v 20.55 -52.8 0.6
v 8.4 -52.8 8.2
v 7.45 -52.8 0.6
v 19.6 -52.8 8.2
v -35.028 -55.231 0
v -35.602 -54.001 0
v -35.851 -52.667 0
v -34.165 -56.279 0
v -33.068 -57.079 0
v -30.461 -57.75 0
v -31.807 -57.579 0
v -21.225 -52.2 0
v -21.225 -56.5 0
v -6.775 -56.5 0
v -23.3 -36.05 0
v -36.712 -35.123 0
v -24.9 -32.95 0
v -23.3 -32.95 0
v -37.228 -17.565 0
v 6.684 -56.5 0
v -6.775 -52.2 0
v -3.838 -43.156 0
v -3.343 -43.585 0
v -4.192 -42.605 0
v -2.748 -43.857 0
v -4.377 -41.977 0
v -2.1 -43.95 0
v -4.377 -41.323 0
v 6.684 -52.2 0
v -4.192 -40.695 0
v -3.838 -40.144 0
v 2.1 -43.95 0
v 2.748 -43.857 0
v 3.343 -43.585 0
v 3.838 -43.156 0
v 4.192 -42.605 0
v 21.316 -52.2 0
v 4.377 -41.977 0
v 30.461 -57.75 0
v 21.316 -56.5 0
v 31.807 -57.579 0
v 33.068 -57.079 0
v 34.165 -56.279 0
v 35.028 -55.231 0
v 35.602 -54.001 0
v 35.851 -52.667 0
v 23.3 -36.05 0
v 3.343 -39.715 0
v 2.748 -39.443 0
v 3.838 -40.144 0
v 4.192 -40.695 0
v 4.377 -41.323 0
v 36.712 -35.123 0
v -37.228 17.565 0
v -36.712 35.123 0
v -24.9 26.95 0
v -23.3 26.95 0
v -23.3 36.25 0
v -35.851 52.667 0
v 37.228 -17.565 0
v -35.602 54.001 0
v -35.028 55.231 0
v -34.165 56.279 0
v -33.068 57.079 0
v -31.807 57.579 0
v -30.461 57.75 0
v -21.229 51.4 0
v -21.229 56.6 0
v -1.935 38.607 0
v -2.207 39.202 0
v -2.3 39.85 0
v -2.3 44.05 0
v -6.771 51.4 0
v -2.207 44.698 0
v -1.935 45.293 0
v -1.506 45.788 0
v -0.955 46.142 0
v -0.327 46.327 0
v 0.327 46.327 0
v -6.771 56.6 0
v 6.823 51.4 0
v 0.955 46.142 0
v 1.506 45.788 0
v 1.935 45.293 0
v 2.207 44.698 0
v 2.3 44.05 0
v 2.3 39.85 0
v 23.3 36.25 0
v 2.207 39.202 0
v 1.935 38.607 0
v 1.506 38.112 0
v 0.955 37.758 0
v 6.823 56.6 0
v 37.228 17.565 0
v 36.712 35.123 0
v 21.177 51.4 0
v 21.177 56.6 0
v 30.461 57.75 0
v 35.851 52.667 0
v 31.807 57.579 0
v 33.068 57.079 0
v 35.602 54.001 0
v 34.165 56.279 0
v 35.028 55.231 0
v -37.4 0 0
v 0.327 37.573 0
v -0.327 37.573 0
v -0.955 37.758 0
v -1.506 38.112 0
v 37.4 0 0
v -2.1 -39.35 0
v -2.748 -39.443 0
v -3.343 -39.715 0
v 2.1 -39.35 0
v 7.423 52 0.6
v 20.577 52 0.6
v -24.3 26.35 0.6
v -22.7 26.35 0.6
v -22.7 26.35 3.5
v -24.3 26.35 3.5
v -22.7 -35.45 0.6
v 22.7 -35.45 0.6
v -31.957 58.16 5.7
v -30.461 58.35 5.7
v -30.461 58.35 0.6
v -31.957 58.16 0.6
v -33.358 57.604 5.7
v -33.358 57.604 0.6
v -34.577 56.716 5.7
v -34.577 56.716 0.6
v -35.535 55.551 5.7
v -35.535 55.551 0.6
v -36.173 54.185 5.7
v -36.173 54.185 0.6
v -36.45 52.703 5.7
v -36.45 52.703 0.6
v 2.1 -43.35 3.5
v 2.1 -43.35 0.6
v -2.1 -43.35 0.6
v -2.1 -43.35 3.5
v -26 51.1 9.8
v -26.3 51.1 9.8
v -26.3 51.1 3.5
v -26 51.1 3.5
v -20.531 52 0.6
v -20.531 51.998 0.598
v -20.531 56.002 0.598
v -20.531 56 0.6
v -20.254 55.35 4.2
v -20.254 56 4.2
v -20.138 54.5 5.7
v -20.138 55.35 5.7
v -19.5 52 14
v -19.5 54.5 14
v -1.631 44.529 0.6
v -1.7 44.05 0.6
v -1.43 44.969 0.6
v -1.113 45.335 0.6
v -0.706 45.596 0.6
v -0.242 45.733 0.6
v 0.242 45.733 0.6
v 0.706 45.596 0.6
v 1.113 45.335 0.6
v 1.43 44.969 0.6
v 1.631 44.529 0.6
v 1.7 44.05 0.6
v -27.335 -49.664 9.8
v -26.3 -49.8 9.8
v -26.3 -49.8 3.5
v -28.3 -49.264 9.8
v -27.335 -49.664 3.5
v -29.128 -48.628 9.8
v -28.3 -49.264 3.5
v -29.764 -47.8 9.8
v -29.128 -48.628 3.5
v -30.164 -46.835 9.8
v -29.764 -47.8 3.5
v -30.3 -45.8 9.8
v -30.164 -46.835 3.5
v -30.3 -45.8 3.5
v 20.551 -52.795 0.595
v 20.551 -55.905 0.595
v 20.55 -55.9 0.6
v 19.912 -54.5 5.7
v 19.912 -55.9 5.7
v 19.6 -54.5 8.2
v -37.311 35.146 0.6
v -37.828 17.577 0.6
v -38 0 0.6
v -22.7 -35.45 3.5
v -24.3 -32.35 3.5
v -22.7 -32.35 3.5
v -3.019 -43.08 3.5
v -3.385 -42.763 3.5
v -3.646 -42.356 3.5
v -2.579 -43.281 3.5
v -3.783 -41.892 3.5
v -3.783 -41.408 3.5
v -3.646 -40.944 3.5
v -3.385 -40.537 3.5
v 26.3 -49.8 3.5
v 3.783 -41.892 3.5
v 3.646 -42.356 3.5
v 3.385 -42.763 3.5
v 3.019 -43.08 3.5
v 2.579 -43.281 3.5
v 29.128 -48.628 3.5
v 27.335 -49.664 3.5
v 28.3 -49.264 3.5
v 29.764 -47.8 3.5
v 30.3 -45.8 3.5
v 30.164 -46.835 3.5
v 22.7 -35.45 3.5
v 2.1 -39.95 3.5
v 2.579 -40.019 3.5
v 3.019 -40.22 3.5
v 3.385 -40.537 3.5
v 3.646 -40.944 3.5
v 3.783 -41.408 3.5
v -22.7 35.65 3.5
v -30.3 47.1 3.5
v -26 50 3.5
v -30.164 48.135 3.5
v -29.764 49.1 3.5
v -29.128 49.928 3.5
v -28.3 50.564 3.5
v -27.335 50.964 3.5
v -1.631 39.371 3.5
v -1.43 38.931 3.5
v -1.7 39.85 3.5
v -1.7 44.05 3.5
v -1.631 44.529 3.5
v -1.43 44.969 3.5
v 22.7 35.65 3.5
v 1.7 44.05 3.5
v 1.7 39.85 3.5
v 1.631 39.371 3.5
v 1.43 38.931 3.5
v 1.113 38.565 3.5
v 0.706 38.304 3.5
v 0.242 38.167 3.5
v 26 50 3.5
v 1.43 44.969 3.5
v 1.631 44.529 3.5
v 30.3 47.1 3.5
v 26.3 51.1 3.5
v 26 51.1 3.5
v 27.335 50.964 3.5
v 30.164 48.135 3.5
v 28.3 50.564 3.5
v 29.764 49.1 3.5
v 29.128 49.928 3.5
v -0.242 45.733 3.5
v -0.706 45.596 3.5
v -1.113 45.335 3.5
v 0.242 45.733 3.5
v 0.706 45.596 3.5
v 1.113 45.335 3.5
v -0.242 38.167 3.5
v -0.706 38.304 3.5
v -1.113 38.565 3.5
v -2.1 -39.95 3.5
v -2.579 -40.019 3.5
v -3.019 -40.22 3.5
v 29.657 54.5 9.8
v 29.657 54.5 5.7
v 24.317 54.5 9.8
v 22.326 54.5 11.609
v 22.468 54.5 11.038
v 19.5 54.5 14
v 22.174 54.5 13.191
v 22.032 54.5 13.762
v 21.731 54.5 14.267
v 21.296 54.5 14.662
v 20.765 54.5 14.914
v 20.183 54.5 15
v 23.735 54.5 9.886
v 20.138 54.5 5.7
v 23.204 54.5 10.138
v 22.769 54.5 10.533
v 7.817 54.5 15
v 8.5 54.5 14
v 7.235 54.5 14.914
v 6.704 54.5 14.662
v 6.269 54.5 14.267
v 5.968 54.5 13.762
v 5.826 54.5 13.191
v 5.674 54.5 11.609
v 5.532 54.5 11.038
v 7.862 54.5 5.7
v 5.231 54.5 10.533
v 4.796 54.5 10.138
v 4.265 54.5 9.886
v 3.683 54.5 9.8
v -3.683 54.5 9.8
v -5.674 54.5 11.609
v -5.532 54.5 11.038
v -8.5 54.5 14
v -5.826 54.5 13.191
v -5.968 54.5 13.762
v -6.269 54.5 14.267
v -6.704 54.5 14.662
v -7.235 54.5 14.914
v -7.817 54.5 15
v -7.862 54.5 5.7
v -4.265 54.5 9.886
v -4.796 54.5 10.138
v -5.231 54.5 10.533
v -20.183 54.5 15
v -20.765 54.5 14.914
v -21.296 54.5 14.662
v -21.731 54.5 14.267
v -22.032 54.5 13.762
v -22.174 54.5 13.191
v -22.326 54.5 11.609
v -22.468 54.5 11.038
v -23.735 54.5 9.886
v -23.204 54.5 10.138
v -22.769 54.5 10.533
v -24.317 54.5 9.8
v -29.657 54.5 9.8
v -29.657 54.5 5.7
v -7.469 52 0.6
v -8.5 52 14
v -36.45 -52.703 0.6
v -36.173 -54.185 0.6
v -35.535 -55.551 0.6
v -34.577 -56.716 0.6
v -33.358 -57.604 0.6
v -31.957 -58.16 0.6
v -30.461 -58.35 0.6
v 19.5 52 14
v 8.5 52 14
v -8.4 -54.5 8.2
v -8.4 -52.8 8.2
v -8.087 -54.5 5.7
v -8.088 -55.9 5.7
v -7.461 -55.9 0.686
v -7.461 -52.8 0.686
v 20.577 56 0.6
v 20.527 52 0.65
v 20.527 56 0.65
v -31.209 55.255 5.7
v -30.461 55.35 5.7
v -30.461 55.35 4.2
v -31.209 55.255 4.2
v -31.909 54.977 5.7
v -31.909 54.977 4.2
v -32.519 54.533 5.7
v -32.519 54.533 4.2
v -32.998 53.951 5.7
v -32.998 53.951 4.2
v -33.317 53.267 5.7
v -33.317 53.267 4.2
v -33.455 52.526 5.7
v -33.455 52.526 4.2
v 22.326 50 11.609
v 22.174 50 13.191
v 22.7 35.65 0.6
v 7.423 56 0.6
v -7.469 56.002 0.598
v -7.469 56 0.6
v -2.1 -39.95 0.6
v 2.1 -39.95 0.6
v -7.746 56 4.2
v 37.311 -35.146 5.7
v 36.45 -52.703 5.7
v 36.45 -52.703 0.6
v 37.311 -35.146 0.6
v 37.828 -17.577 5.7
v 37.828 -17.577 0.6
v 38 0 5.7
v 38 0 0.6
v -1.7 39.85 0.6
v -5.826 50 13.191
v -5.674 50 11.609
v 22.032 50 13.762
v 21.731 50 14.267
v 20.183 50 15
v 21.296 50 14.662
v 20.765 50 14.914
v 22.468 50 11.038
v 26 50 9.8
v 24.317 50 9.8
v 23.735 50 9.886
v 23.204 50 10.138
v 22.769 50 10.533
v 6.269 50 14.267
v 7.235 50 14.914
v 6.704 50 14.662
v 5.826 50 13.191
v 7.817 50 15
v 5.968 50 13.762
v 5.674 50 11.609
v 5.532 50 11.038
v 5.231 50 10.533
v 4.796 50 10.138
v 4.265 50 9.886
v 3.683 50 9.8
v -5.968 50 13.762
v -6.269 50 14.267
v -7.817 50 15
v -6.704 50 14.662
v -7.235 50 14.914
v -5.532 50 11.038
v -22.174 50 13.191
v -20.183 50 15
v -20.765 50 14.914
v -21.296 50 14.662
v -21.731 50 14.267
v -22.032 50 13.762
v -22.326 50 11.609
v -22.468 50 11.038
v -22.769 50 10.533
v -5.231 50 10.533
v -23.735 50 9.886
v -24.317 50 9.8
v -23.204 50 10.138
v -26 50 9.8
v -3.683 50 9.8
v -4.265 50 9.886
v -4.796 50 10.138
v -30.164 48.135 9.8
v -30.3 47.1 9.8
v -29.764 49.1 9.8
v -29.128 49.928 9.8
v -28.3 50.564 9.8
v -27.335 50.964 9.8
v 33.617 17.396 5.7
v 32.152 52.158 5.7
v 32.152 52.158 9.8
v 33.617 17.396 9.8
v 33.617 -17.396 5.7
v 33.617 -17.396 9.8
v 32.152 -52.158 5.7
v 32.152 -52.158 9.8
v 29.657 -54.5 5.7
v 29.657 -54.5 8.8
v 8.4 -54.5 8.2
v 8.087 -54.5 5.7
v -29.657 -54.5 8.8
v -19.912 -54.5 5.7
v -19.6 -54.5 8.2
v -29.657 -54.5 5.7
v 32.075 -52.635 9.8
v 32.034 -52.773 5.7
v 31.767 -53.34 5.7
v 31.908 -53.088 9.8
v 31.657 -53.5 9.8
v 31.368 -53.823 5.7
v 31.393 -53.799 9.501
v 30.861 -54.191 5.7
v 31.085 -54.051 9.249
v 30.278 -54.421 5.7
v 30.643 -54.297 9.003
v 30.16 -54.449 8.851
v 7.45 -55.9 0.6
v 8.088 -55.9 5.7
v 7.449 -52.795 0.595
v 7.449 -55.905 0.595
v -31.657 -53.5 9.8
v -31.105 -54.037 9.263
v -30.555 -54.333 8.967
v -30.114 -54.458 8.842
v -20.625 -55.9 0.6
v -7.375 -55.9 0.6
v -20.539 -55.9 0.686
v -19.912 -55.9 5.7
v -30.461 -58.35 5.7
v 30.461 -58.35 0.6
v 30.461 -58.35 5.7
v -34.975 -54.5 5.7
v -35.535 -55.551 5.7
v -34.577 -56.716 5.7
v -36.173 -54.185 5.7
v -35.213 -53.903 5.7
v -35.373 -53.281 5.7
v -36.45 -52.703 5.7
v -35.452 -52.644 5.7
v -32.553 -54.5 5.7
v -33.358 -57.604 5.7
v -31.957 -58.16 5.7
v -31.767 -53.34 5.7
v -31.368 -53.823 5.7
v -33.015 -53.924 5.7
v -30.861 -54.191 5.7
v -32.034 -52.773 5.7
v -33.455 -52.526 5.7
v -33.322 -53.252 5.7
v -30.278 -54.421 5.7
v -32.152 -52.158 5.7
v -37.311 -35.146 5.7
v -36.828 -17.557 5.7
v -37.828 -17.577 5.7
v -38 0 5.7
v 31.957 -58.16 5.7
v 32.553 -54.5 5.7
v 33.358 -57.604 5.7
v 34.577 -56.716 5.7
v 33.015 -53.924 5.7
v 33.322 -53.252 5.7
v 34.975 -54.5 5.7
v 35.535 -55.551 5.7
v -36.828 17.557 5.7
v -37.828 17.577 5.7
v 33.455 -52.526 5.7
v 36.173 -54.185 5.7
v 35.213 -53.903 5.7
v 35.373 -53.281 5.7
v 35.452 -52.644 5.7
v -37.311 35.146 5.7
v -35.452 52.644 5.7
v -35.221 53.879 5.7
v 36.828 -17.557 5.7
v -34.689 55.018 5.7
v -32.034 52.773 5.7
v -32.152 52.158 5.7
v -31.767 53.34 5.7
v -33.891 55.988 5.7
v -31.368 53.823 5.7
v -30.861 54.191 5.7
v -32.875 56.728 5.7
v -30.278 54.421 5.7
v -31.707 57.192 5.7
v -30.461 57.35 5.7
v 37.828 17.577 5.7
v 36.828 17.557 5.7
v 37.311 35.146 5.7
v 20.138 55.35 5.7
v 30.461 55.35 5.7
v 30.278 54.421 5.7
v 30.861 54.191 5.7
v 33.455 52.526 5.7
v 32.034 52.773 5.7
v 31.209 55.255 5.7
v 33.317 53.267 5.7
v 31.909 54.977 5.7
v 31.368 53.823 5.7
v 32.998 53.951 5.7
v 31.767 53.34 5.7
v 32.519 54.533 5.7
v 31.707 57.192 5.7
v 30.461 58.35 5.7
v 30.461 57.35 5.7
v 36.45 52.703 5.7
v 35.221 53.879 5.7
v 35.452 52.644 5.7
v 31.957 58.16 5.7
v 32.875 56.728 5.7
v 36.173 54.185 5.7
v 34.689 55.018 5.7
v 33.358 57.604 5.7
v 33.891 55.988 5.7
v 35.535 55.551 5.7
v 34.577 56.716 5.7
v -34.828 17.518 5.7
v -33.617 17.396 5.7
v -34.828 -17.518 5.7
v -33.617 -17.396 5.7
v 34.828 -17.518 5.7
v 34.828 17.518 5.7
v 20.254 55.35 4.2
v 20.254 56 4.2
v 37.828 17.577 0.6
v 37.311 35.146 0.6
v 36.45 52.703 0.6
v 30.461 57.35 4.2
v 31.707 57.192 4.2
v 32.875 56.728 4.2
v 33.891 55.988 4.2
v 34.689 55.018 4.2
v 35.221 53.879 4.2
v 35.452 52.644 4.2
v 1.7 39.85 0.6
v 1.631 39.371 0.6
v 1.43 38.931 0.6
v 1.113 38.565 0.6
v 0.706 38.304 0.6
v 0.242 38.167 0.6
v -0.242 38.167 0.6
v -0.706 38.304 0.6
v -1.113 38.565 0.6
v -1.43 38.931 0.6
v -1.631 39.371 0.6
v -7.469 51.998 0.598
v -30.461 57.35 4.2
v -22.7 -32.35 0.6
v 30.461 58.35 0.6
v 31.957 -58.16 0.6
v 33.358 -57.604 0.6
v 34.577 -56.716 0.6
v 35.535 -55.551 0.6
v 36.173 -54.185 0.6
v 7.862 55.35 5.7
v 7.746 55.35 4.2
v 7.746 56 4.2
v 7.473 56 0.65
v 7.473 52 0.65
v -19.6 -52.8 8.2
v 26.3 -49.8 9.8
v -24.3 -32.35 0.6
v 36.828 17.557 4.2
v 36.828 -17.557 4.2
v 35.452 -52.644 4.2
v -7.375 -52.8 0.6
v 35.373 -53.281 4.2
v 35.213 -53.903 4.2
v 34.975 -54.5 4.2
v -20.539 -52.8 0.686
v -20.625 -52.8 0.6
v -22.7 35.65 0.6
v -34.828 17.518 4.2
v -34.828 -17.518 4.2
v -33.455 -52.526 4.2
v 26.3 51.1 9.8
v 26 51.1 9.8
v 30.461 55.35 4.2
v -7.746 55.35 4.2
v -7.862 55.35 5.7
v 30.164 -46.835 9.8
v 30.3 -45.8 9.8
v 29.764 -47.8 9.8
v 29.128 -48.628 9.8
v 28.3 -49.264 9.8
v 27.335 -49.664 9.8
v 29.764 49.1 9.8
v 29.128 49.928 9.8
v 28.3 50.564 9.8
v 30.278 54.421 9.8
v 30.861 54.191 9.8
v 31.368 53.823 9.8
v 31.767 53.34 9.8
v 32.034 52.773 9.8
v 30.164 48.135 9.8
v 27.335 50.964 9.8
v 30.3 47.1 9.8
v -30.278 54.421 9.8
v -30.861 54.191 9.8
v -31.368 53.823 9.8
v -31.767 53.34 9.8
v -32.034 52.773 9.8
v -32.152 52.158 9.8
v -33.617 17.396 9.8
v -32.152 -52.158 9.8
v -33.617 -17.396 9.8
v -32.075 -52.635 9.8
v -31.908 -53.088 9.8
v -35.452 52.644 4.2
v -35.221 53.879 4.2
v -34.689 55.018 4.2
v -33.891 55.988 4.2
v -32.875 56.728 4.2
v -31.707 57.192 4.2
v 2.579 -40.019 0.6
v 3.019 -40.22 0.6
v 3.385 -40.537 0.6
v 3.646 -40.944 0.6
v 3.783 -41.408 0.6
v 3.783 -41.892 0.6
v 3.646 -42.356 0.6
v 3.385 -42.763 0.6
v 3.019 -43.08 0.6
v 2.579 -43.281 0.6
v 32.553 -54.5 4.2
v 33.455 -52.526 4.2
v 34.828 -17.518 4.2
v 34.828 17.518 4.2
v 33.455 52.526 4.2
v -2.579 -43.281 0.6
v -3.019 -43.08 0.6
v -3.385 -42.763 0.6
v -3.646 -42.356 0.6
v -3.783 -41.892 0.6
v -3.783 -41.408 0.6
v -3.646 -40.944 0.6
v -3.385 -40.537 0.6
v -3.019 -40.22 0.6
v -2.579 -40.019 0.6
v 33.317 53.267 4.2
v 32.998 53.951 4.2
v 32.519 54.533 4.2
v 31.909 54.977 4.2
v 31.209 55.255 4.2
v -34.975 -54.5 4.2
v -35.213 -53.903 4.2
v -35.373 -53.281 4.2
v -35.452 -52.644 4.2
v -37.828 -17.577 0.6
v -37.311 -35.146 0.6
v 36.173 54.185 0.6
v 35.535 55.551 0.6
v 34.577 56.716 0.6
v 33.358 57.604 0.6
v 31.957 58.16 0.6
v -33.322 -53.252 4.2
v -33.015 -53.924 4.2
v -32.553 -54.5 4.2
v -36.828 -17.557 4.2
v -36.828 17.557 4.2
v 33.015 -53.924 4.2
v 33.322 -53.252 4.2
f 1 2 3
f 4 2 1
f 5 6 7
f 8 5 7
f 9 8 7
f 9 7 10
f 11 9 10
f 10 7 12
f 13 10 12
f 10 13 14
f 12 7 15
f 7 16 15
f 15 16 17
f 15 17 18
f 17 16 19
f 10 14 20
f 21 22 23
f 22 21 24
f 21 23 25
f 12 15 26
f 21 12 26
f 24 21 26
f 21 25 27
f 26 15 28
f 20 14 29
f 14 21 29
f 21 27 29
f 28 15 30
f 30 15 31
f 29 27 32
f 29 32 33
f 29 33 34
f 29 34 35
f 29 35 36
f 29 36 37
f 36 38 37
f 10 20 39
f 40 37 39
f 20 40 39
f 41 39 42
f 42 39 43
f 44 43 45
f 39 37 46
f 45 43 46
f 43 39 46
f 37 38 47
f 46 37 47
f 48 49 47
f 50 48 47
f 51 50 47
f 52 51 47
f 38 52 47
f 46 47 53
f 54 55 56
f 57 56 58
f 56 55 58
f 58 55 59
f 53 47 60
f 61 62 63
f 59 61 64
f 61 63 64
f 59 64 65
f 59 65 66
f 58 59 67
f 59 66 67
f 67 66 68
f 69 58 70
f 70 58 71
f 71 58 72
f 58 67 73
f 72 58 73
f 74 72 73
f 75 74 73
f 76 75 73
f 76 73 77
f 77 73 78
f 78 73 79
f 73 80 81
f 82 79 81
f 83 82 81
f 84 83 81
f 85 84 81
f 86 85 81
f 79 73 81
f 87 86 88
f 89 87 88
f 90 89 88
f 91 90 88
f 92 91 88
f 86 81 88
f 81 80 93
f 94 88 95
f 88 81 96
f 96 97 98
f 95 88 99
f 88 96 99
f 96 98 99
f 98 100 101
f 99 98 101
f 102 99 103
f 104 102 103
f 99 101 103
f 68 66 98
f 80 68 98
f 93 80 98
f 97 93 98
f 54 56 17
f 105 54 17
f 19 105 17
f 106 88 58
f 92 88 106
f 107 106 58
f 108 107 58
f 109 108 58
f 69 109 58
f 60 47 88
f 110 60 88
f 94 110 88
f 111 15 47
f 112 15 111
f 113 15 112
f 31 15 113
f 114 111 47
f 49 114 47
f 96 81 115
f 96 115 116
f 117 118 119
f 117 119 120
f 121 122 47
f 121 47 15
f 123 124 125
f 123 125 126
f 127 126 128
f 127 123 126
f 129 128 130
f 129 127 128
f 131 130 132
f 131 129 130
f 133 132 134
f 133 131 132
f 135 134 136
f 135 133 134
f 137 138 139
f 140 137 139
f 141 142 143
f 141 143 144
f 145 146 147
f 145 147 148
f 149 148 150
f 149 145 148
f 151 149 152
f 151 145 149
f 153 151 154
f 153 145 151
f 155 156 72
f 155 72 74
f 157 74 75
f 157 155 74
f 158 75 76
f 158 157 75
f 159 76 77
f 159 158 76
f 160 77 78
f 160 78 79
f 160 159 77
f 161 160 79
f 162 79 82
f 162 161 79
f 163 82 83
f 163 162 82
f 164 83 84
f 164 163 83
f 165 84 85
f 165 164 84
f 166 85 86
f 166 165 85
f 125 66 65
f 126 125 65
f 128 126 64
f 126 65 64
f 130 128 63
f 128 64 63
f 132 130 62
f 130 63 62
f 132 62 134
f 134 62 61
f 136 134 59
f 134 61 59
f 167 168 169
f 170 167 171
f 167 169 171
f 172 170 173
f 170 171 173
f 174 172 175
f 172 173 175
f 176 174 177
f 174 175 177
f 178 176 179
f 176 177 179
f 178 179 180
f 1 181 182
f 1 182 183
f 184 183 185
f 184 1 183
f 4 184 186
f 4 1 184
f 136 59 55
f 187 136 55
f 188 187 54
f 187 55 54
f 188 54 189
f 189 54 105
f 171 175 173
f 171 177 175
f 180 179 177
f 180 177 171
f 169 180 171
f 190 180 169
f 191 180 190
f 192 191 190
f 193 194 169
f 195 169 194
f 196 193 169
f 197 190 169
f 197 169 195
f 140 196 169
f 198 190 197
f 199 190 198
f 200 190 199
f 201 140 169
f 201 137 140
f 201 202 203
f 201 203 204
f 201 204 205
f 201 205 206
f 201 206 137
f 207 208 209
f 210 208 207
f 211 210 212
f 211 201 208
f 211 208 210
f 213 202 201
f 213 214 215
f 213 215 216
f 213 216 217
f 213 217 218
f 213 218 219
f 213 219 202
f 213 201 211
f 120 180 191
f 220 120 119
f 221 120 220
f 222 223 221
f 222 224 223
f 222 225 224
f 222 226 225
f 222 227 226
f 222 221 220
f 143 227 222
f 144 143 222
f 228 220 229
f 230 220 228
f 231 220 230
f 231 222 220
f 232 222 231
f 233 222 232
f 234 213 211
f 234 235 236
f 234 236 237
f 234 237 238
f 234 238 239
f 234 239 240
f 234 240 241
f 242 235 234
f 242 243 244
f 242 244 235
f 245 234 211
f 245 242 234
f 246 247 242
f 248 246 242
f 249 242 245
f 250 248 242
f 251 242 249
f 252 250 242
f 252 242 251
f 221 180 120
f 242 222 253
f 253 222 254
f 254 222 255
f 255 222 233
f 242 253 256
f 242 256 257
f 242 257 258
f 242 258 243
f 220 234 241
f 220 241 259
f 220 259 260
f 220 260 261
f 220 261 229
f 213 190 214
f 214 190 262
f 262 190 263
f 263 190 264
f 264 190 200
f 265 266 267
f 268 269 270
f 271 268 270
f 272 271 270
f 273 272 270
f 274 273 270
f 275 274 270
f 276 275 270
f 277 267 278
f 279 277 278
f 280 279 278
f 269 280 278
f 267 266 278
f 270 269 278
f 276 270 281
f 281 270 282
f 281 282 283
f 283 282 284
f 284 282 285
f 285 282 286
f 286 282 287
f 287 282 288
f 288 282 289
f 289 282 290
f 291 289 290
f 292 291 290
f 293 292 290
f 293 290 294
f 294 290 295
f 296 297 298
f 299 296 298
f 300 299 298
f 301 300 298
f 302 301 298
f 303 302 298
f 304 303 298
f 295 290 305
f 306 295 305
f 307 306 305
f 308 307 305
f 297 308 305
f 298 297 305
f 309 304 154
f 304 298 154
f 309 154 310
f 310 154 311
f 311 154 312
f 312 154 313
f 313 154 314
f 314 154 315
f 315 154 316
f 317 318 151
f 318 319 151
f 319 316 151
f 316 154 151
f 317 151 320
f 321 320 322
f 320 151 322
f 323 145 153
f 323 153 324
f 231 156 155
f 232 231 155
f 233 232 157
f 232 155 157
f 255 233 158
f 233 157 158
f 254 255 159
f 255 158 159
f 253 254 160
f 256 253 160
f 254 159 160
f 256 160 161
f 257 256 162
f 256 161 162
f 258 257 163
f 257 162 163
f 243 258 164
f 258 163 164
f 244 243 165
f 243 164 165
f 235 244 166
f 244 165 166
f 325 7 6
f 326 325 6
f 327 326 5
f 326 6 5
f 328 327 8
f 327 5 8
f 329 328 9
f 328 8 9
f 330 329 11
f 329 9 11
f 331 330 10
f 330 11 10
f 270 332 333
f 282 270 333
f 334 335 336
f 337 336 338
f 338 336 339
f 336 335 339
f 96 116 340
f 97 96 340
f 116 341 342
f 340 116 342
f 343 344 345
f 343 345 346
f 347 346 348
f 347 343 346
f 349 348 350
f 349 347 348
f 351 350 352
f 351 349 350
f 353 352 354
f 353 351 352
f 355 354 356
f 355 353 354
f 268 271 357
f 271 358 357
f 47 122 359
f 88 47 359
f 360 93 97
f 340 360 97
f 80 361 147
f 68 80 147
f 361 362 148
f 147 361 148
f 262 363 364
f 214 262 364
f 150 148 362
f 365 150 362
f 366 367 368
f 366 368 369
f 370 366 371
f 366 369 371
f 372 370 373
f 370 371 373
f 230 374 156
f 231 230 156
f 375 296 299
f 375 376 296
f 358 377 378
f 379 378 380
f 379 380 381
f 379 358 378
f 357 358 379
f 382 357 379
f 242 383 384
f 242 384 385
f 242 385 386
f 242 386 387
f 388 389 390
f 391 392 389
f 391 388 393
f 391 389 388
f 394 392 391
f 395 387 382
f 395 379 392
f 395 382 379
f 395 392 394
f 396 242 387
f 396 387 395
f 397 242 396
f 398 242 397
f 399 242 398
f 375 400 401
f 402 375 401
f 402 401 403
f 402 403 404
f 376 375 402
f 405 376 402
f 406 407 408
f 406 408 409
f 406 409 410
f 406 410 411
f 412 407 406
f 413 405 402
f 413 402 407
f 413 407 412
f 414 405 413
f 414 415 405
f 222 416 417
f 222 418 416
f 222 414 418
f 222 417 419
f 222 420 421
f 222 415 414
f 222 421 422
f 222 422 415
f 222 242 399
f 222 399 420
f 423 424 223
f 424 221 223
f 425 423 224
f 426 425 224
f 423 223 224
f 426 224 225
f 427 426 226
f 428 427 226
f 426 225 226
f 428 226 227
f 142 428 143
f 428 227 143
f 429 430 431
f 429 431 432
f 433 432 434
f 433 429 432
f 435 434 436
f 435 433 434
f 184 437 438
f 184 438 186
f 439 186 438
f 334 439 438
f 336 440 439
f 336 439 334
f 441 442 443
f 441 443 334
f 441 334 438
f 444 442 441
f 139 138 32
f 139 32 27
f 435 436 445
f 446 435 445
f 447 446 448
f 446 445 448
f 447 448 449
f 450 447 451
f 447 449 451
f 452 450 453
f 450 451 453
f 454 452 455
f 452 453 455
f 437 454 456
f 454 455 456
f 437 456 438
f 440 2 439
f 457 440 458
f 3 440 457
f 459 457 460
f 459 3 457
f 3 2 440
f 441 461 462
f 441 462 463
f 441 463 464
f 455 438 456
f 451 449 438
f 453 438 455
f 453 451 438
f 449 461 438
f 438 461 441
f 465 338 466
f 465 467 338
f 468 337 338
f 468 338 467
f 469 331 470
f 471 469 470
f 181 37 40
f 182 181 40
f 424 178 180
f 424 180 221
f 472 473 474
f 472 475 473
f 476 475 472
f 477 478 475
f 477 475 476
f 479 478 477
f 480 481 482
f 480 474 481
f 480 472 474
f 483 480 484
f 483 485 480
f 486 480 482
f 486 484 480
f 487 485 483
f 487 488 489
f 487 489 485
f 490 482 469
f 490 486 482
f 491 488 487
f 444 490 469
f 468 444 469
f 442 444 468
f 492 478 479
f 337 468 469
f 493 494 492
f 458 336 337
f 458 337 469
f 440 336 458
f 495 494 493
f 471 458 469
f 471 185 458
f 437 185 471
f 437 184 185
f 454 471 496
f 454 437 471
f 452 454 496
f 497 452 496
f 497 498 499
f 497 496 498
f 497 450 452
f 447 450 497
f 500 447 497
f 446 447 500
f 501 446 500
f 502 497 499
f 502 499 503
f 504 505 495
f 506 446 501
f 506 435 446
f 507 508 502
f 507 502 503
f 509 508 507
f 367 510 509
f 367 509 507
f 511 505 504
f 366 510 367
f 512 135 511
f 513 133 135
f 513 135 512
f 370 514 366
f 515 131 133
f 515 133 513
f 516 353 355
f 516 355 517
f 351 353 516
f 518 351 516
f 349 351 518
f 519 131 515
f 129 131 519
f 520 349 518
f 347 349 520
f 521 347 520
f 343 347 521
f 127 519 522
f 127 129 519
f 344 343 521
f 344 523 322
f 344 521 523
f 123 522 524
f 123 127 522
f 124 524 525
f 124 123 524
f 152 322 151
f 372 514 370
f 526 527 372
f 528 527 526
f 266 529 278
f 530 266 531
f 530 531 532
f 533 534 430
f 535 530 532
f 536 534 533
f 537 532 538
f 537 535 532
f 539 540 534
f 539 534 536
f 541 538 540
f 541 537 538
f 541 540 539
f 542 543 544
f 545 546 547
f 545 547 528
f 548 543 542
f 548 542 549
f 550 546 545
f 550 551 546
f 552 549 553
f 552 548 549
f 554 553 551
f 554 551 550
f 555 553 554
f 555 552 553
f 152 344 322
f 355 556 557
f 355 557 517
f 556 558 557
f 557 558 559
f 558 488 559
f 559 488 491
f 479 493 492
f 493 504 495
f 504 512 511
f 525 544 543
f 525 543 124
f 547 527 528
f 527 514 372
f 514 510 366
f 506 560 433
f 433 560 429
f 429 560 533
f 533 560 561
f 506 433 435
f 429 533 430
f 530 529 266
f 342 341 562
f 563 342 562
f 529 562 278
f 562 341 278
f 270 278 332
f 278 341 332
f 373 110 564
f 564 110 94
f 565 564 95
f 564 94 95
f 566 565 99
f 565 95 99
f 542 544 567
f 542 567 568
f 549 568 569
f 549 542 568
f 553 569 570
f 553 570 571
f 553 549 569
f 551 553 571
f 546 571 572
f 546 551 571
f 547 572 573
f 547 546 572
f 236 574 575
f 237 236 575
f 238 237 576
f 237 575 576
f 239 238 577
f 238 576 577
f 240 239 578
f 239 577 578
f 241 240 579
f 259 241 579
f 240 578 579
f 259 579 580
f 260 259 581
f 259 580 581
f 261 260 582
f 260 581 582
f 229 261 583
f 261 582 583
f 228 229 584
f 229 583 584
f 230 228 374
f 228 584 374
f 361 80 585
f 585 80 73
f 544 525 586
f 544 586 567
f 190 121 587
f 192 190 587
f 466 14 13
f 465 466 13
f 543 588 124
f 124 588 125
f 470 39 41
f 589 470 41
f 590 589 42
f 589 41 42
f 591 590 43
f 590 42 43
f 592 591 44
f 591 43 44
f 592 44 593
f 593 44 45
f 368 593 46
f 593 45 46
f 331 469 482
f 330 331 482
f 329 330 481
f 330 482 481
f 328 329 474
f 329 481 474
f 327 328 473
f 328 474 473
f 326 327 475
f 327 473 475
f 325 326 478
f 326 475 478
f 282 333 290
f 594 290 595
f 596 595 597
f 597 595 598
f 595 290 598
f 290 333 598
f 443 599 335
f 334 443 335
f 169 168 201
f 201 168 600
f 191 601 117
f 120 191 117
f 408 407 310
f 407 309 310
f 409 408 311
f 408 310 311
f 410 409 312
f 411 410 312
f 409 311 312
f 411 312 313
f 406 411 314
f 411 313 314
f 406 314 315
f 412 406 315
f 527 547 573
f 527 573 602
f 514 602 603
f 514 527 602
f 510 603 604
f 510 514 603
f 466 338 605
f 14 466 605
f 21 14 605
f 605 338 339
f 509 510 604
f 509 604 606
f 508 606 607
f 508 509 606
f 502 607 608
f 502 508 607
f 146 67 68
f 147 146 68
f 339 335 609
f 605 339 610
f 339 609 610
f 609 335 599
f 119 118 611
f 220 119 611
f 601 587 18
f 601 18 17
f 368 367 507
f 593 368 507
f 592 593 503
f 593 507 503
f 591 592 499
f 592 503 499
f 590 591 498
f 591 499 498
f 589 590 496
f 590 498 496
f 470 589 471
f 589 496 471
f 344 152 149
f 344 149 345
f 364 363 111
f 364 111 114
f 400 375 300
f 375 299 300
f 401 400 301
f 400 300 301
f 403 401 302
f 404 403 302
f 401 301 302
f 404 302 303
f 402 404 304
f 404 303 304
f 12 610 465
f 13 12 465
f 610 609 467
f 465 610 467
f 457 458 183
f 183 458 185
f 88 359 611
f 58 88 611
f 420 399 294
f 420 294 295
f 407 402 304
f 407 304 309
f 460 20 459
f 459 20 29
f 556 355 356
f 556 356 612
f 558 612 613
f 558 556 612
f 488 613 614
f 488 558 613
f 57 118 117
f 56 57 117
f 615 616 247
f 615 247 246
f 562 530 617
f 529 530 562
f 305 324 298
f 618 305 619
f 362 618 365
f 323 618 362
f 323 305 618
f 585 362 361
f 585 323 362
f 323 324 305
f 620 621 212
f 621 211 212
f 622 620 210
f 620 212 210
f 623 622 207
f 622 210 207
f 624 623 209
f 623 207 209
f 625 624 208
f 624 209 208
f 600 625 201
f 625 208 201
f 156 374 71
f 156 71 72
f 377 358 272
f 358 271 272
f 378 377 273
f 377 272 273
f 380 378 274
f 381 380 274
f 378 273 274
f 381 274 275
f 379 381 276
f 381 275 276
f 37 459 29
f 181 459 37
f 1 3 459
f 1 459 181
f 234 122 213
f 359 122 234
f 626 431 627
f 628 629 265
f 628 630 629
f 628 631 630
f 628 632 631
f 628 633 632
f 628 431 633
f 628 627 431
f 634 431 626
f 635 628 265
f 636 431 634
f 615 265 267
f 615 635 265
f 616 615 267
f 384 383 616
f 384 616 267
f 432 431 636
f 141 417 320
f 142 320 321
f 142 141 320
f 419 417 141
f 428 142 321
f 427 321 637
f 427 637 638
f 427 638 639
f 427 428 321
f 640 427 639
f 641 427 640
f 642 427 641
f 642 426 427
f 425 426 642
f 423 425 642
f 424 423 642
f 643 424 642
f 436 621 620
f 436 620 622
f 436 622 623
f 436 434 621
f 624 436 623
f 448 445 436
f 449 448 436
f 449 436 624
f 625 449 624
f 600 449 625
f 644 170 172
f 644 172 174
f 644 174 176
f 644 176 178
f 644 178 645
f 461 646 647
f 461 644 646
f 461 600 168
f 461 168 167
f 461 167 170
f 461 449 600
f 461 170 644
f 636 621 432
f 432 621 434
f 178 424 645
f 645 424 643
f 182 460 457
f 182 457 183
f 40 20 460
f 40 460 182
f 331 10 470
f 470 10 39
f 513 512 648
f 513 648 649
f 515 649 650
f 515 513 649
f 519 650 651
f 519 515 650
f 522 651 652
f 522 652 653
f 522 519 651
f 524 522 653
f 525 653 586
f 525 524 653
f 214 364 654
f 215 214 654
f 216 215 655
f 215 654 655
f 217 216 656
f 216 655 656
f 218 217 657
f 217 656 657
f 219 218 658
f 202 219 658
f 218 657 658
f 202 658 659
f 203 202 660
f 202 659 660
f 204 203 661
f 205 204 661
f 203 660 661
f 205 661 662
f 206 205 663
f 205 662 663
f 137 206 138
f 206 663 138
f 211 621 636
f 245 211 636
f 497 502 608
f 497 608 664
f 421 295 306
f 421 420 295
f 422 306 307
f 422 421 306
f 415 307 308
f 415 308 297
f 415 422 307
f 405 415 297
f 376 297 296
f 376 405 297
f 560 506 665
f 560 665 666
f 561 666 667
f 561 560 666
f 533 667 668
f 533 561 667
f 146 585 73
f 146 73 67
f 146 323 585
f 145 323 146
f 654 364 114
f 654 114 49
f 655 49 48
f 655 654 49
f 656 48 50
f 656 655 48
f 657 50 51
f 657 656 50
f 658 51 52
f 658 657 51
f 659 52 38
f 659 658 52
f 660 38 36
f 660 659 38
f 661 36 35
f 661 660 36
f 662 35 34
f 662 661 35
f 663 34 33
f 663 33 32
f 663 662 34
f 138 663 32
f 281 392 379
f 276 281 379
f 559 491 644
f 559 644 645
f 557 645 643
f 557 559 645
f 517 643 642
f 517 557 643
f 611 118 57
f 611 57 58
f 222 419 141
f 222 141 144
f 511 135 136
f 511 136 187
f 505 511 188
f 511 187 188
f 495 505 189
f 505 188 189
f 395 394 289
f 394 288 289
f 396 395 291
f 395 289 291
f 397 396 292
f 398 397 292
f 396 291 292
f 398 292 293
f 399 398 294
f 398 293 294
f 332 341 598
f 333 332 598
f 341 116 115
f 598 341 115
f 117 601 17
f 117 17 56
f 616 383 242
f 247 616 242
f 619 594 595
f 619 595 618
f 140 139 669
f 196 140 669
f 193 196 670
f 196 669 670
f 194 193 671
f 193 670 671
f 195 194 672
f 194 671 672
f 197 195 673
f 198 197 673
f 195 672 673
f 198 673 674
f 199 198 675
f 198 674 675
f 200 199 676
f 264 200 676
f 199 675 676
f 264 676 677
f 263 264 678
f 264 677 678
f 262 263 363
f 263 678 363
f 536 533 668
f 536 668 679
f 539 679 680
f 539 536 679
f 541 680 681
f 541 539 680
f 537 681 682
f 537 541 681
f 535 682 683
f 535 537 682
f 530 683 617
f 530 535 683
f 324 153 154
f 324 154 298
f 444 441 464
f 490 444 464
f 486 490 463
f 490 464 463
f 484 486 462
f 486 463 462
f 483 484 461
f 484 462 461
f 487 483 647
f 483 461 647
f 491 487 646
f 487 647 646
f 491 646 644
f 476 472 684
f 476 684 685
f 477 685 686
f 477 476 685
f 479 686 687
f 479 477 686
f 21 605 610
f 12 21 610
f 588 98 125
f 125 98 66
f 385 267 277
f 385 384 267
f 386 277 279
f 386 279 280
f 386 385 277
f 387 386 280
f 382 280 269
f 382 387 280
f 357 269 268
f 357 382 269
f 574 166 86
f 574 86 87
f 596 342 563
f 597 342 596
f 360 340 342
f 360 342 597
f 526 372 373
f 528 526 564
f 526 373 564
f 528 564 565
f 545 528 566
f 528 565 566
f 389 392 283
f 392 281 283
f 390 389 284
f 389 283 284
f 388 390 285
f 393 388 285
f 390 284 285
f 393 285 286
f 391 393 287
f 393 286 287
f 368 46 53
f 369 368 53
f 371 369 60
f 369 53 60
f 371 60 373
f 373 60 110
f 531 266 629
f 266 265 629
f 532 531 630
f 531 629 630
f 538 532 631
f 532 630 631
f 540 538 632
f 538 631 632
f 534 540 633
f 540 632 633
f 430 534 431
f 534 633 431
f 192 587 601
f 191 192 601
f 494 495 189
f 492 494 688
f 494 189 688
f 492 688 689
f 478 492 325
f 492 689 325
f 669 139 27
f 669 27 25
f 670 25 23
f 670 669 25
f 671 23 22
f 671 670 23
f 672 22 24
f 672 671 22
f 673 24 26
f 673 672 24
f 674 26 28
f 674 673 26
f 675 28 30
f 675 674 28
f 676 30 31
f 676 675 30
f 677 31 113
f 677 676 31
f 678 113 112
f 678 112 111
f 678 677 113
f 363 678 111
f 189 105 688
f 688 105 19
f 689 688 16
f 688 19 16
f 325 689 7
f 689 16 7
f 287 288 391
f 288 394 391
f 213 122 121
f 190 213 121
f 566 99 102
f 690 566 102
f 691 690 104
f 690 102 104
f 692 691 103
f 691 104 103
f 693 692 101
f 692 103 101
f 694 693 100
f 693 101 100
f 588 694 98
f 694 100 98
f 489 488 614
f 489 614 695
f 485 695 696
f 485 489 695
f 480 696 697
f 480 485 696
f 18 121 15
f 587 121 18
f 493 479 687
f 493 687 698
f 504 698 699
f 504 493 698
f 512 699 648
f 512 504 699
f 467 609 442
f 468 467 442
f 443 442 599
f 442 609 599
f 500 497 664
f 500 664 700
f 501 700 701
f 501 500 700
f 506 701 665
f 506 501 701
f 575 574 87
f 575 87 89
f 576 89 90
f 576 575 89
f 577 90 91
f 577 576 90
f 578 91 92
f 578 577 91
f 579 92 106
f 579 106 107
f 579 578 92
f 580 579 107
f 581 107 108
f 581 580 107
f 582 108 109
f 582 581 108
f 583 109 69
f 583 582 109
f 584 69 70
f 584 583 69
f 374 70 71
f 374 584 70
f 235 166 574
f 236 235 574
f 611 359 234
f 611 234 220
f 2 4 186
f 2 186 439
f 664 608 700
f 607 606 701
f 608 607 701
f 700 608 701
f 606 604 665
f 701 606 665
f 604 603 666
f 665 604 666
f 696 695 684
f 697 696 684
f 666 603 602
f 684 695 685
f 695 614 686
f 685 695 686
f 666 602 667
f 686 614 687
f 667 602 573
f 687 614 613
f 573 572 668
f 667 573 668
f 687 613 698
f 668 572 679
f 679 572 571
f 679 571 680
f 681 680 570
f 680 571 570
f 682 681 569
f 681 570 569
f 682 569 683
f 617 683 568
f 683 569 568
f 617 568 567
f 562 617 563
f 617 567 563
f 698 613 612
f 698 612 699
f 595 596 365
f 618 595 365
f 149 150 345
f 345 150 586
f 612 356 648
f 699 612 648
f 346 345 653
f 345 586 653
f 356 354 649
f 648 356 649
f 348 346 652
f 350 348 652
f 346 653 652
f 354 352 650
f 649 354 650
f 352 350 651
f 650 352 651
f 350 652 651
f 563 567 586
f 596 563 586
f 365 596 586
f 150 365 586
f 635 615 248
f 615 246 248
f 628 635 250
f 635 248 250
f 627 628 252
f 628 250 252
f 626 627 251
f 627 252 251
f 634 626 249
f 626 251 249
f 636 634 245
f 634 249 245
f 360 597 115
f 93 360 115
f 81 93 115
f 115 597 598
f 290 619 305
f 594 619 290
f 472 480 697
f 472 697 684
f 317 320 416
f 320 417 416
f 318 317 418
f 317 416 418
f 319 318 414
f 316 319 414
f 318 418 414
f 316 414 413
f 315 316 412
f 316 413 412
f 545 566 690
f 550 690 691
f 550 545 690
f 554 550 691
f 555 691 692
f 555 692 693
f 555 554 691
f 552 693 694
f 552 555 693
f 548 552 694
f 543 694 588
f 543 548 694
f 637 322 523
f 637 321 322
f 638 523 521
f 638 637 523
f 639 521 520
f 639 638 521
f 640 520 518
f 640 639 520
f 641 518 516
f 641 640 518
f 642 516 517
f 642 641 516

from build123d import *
from OCP.BRepFilletAPI import BRepFilletAPI_MakeChamfer

# Parameters (mm, degrees)
BOSS_EXTRUDE1_DEPTH = 9.8
CUT_EXTRUDE1_START  = -4.1
CUT_EXTRUDE1_DEPTH  = 4.1
SKETCH3_W           = 60.6
SKETCH3_H           = 100.9
CUT_EXTRUDE2_DEPTH  = 6.3
SKETCH4_W           = 1.6
SKETCH4_H           = 58.7
SKETCH4_W_2         = 45.4
SKETCH4_H_2         = 71.1
CUT_EXTRUDE3_DEPTH  = 71.319005255
BOSS_EXTRUDE3_START = -4.5
BOSS_EXTRUDE3_DEPTH = 4.5
CUT_EXTRUDE4_START  = -2.5
CUT_EXTRUDE4_DEPTH  = 4
CUT_EXTRUDE5_START  = -1.7
CUT_EXTRUDE5_DEPTH  = 3.1
FILLET1_R           = 6
FILLET2_R           = 4
FILLET3_R           = 2.5
CUT_EXTRUDE6_DEPTH  = 1.5
CHAMFER1_SIZE       = 1
CHAMFER2_SIZE       = 0.6
CHAMFER2_SIZE2      = 0.651920241
CHAMFER2_SIZE2_2    = 0.691050664
FILLET4_R           = 2


# Read off the part's stored shape, not the designer's step: Boss-Extrude3
with BuildPart() as part:
    # Sketch1 → Boss-Extrude1 (new body)
    with BuildSketch(Plane.XY):
        with BuildLine():
            ThreePointArc((-38, 0), (-37.524874157, -29.190462912), (-36.1, -58.35))
            Line((-36.1, -58.35), (36.1, -58.35))
            ThreePointArc((36.1, -58.35), (37.524874157, -29.190462912), (38, 0))
            ThreePointArc((38, 0), (37.524874157, 29.190462912), (36.1, 58.35))
            Line((36.1, 58.35), (-36.1, 58.35))
            ThreePointArc((-36.1, 58.35), (-37.524874157, 29.190462912), (-38, 0))
        make_face()
    extrude(amount=BOSS_EXTRUDE1_DEPTH)

    # Sketch2 → Cut-Extrude1 (cut)
    with BuildSketch(Plane.XY.offset(9.8).offset(CUT_EXTRUDE1_START)):
        with BuildLine():
            ThreePointArc((36.1, -58.35), (38, 0), (36.1, 58.35))
            Line((36.1, 58.35), (-36.1, 58.35))
            ThreePointArc((-36.1, 58.35), (-38, 0), (-36.1, -58.35))
            Line((-36.1, -58.35), (36.1, -58.35))
        make_face()
        with BuildLine():
            Line((-32, 54.5), (32, 54.5))
            ThreePointArc((32, 54.5), (33.8, 0), (32, -54.5))
            Line((32, -54.5), (-32, -54.5))
            ThreePointArc((-32, -54.5), (-33.8, 0), (-32, 54.5))
        make_face(mode=Mode.SUBTRACT)
    extrude(amount=CUT_EXTRUDE1_DEPTH, mode=Mode.SUBTRACT)

    # Sketch3 → Cut-Extrude2 (cut)
    with BuildSketch(Plane.XY.offset(9.8)):
        with Locations((0, 0.65)):
            Rectangle(SKETCH3_W, SKETCH3_H)
    extrude(amount=-CUT_EXTRUDE2_DEPTH, mode=Mode.SUBTRACT)

    # Sketch4 → Cut-Extrude3 (cut, through all)
    with BuildSketch(Plane(origin=(0, 0, 0), x_dir=(-1, 0, 0), z_dir=(0, 0, -1))):
        with Locations((23.5, -3)):
            Rectangle(SKETCH4_W, SKETCH4_H)
        with Locations((0, 0.1)):
            Rectangle(SKETCH4_W_2, SKETCH4_H_2)
        with BuildLine():
            Line((-2.1, -43.35), (2.1, -43.35))
            ThreePointArc((2.1, -43.35), (3.8, -41.65), (2.1, -39.95))
            Line((2.1, -39.95), (-2.1, -39.95))
            ThreePointArc((-2.1, -39.95), (-3.8, -41.65), (-2.1, -43.35))
        make_face()
        with BuildLine():
            Line((1.7, 39.85), (1.7, 44.05))
            ThreePointArc((1.7, 44.05), (0, 45.75), (-1.7, 44.05))
            Line((-1.7, 44.05), (-1.7, 39.85))
            ThreePointArc((-1.7, 39.85), (0, 38.15), (1.7, 39.85))
        make_face()
    extrude(amount=-CUT_EXTRUDE3_DEPTH, mode=Mode.SUBTRACT)

    # Boss-Extrude3 outline → Boss-Extrude3 (add)
    with BuildSketch(Plane(origin=(0, 54.5, 0), x_dir=(1, 0, 0), z_dir=(0, 1, 0)).offset(BOSS_EXTRUDE3_START)):
        Polygon((0, -3.5), (0, -9.8), (5.5, -9.8), (6, -15), (22, -15), (22.5, -9.8), (26, -9.8), (26, -3.5), align=None)
    boss_extrude3 = extrude(amount=BOSS_EXTRUDE3_DEPTH)

    # Sketch7 → Cut-Extrude4 (cut)
    with BuildSketch(Plane(origin=(0, 54.5, 0), x_dir=(1, 0, 0), z_dir=(0, 1, 0)).offset(CUT_EXTRUDE4_START)):
        Polygon((19.5, -14), (8.5, -14), (7.346153846, 1), (20.653846154, 1), align=None)
    cut_extrude4 = extrude(amount=CUT_EXTRUDE4_DEPTH, mode=Mode.SUBTRACT)

    # Mirror3: Boss-Extrude3, Cut-Extrude4 across plane
    add(boss_extrude3.mirror(Plane(origin=(0, 0, 0), x_dir=(0, 0, 1), z_dir=(1, 0, 0))))
    add(cut_extrude4.mirror(Plane(origin=(0, 0, 0), x_dir=(0, 0, 1), z_dir=(1, 0, 0))), mode=Mode.SUBTRACT)

    # Sketch8 → Cut-Extrude5 (cut)
    with BuildSketch(Plane.XZ.offset(54.5).offset(CUT_EXTRUDE5_START)):
        Polygon((-20.75, -1), (-19.6, 8.2), (-8.4, 8.2), (-7.25, -1), align=None)
    cut_extrude5 = extrude(amount=CUT_EXTRUDE5_DEPTH, mode=Mode.SUBTRACT)

    # Mirror4: Cut-Extrude5 across plane
    add(cut_extrude5.mirror(Plane(origin=(0, 0, 0), x_dir=(0, 0, 1), z_dir=(1, 0, 0))), mode=Mode.SUBTRACT)

    # Fillet1
    fillet1_edges = [part.edges().sort_by_distance(p)[0] for p in [
        (36.1, 58.35, 2.85),
        (36.1, -58.35, 2.85),
        (-36.1, -58.35, 2.85),
        (-36.1, 58.35, 2.85),
    ]]
    fillet(fillet1_edges, radius=FILLET1_R)

    # Fillet2
    fillet2_edges = [part.edges().sort_by_distance(p)[0] for p in [
        (-30.3, -49.8, 6.65),
        (-30.3, 51.1, 6.65),
        (30.3, 51.1, 6.65),
        (30.3, -49.8, 6.65),
    ]]
    fillet(fillet2_edges, radius=FILLET2_R)

    # Fillet3
    fillet3_edges = [part.edges().sort_by_distance(p)[0] for p in [
        (32, 54.5, 7.75),
        (-32, 54.5, 7.75),
        (-32, -54.5, 7.75),
        (32, -54.5, 7.75),
    ]]
    fillet(fillet3_edges, radius=FILLET3_R)

    # Sketch10 → Cut-Extrude6 (cut)
    with BuildSketch(Plane.XY.offset(5.7)):
        with BuildLine():
            Line((30.460657239, 55.35), (-30.460657239, 55.35))
            ThreePointArc((-30.460657239, 55.35), (-32.518710973, 54.532753955), (-33.455473858, 52.526276553))
            ThreePointArc((-33.455473858, 52.526276553), (-35, 0), (-33.455473858, -52.526276553))
            ThreePointArc((-33.455473858, -52.526276553), (-33.188926222, -53.597617073), (-32.552904835, -54.5))
            Line((-32.552904835, -54.5), (-34.974801677, -54.5))
            ThreePointArc((-34.974801677, -54.5), (-35.303180702, -53.59497651), (-35.45201827, -52.643794255))
            ThreePointArc((-35.45201827, -52.643794255), (-37, 0), (-35.45201827, 52.643794255))
            ThreePointArc((-35.45201827, 52.643794255), (-33.890746795, 55.987923259), (-30.460657239, 57.35))
            Line((-30.460657239, 57.35), (30.460657239, 57.35))
            ThreePointArc((30.460657239, 57.35), (33.890746795, 55.987923259), (35.45201827, 52.643794255))
            ThreePointArc((35.45201827, 52.643794255), (37, 0), (35.45201827, -52.643794255))
            ThreePointArc((35.45201827, -52.643794255), (35.303180702, -53.59497651), (34.974801677, -54.5))
            Line((34.974801677, -54.5), (32.552904835, -54.5))
            ThreePointArc((32.552904835, -54.5), (33.188926222, -53.597617073), (33.455473858, -52.526276553))
            ThreePointArc((33.455473858, -52.526276553), (35, 0), (33.455473858, 52.526276553))
            ThreePointArc((33.455473858, 52.526276553), (32.518710973, 54.532753955), (30.460657239, 55.35))
        make_face()
    extrude(amount=-CUT_EXTRUDE6_DEPTH, mode=Mode.SUBTRACT)

    # Chamfer1
    # the kernel refuses this chamfer: 1 mm, written as the material it takes off along each edge
    with BuildSketch(Plane(origin=(32.228209132, -54.5, 9.8), x_dir=(0, 0.9996219169112968, 0.02749587661058555), z_dir=(-1, 0, 0))) as chamfer1_piece_1:
        Polygon((CHAMFER1_SIZE * 0.999621916911, CHAMFER1_SIZE * 0.0274958766106), (-CHAMFER1_SIZE * 0.0274958766106, CHAMFER1_SIZE * 0.999621916911), (0, 0), align=None)
    extrude(amount=64.456418264, mode=Mode.SUBTRACT)

    # Chamfer2: one chamfer whose edges measure the first distance from different faces: ONE call of the kernel's chamfer builder (chamfer() names one face for all edges)
    chamfer2_edges_1 = [part.edges().sort_by_distance(p)[0] for p in [
        (14, 52, 0),
        (14, 56, 0),
        (-14, 52, 0),
        (-14, 56, 0),
        (-14, -52.8, 0),
        (-14, -55.9, 0),
        (14, -52.8, 0),
        (14, -55.9, 0),
        (0, -58.35, 0),
        (0, 58.35, 0),
        (38, 0, 0),
        (-38, 0, 0),
        (34.576764706, 56.715507911, 0),
        (-34.576764706, 56.715507911, 0),
        (34.576764706, -56.715507911, 0),
        (-34.576764706, -56.715507911, 0),
        (1.7, 41.95, 0),
        (-1.7, 41.95, 0),
        (0, 45.75, 0),
        (0, 38.15, 0),
        (0, -39.95, 0),
        (0, -43.35, 0),
        (-3.8, -41.65, 0),
        (3.8, -41.65, 0),
        (-23.5, -32.35, 0),
        (-22.7, -33.9, 0),
        (0, 35.65, 0),
        (-22.7, 31, 0),
        (-23.5, 26.35, 0),
        (-24.3, -3, 0),
        (22.7, 0.1, 0),
        (0, -35.45, 0),
    ]]
    chamfer2_edges_2 = [part.edges().sort_by_distance(p)[0] for p in [
        (20.576923077, 54, 0),
        (7.423076923, 54, 0),
    ]]
    chamfer2_side_2 = [part.faces().sort_by_distance(p)[0] for p in [
        (0, -56.957344623, 0),
    ]]
    chamfer2_edges_3 = [part.edges().sort_by_distance(p)[0] for p in [
        (-20.576923077, 54, 0),
    ]]
    chamfer2_side_3 = [part.faces().sort_by_distance(p)[0] for p in [
        (-20.098958851, 53.596109806, 6.213534938),
    ]]
    chamfer2_edges_4 = [part.edges().sort_by_distance(p)[0] for p in [
        (-7.423076923, 54, 0),
    ]]
    chamfer2_side_4 = [part.faces().sort_by_distance(p)[0] for p in [
        (-7.901041149, 53.596109806, 6.213534938),
    ]]
    chamfer2_edges_5 = [part.edges().sort_by_distance(p)[0] for p in [
        (-7.375, -54.35, 0),
        (-20.625, -54.35, 0),
    ]]
    chamfer2_side_5 = [part.faces().sort_by_distance(p)[0] for p in [
        (0, -56.957344623, 0),
    ]]
    chamfer2_edges_6 = [part.edges().sort_by_distance(p)[0] for p in [
        (20.625, -54.35, 0),
    ]]
    chamfer2_side_6 = [part.faces().sort_by_distance(p)[0] for p in [
        (20.169382984, -54.214279197, 3.644936131),
    ]]
    chamfer2_edges_7 = [part.edges().sort_by_distance(p)[0] for p in [
        (7.375, -54.35, 0),
    ]]
    chamfer2_side_7 = [part.faces().sort_by_distance(p)[0] for p in [
        (7.830617016, -54.214279197, 3.644936131),
    ]]
    chamfer2 = BRepFilletAPI_MakeChamfer(part.part.solid().wrapped)
    for e in chamfer2_edges_1:
        chamfer2.Add(CHAMFER2_SIZE, e.wrapped)
    for e in chamfer2_edges_2:
        chamfer2.Add(CHAMFER2_SIZE, CHAMFER2_SIZE2, e.wrapped, chamfer2_side_2[0].wrapped)  # the first distance lies on this face
    for e in chamfer2_edges_3:
        chamfer2.Add(CHAMFER2_SIZE, CHAMFER2_SIZE2, e.wrapped, chamfer2_side_3[0].wrapped)  # the first distance lies on this face
    for e in chamfer2_edges_4:
        chamfer2.Add(CHAMFER2_SIZE, CHAMFER2_SIZE2, e.wrapped, chamfer2_side_4[0].wrapped)  # the first distance lies on this face
    for e in chamfer2_edges_5:
        chamfer2.Add(CHAMFER2_SIZE, CHAMFER2_SIZE2_2, e.wrapped, chamfer2_side_5[0].wrapped)  # the first distance lies on this face
    for e in chamfer2_edges_6:
        chamfer2.Add(CHAMFER2_SIZE, CHAMFER2_SIZE2_2, e.wrapped, chamfer2_side_6[0].wrapped)  # the first distance lies on this face
    for e in chamfer2_edges_7:
        chamfer2.Add(CHAMFER2_SIZE, CHAMFER2_SIZE2_2, e.wrapped, chamfer2_side_7[0].wrapped)  # the first distance lies on this face
    add(Compound.cast(chamfer2.Shape()), mode=Mode.REPLACE)

    # Fillet4
    fillet4_edges = [part.edges().sort_by_distance(p)[0] for p in [
        (5.5, 52.25, 9.8),
        (22.5, 52.25, 9.8),
        (22, 52.25, 15),
        (6, 52.25, 15),
        (-22.5, 52.25, 9.8),
        (-5.5, 52.25, 9.8),
        (-6, 52.25, 15),
        (-22, 52.25, 15),
    ]]
    fillet(fillet4_edges, radius=FILLET4_R)


solid = part.part
